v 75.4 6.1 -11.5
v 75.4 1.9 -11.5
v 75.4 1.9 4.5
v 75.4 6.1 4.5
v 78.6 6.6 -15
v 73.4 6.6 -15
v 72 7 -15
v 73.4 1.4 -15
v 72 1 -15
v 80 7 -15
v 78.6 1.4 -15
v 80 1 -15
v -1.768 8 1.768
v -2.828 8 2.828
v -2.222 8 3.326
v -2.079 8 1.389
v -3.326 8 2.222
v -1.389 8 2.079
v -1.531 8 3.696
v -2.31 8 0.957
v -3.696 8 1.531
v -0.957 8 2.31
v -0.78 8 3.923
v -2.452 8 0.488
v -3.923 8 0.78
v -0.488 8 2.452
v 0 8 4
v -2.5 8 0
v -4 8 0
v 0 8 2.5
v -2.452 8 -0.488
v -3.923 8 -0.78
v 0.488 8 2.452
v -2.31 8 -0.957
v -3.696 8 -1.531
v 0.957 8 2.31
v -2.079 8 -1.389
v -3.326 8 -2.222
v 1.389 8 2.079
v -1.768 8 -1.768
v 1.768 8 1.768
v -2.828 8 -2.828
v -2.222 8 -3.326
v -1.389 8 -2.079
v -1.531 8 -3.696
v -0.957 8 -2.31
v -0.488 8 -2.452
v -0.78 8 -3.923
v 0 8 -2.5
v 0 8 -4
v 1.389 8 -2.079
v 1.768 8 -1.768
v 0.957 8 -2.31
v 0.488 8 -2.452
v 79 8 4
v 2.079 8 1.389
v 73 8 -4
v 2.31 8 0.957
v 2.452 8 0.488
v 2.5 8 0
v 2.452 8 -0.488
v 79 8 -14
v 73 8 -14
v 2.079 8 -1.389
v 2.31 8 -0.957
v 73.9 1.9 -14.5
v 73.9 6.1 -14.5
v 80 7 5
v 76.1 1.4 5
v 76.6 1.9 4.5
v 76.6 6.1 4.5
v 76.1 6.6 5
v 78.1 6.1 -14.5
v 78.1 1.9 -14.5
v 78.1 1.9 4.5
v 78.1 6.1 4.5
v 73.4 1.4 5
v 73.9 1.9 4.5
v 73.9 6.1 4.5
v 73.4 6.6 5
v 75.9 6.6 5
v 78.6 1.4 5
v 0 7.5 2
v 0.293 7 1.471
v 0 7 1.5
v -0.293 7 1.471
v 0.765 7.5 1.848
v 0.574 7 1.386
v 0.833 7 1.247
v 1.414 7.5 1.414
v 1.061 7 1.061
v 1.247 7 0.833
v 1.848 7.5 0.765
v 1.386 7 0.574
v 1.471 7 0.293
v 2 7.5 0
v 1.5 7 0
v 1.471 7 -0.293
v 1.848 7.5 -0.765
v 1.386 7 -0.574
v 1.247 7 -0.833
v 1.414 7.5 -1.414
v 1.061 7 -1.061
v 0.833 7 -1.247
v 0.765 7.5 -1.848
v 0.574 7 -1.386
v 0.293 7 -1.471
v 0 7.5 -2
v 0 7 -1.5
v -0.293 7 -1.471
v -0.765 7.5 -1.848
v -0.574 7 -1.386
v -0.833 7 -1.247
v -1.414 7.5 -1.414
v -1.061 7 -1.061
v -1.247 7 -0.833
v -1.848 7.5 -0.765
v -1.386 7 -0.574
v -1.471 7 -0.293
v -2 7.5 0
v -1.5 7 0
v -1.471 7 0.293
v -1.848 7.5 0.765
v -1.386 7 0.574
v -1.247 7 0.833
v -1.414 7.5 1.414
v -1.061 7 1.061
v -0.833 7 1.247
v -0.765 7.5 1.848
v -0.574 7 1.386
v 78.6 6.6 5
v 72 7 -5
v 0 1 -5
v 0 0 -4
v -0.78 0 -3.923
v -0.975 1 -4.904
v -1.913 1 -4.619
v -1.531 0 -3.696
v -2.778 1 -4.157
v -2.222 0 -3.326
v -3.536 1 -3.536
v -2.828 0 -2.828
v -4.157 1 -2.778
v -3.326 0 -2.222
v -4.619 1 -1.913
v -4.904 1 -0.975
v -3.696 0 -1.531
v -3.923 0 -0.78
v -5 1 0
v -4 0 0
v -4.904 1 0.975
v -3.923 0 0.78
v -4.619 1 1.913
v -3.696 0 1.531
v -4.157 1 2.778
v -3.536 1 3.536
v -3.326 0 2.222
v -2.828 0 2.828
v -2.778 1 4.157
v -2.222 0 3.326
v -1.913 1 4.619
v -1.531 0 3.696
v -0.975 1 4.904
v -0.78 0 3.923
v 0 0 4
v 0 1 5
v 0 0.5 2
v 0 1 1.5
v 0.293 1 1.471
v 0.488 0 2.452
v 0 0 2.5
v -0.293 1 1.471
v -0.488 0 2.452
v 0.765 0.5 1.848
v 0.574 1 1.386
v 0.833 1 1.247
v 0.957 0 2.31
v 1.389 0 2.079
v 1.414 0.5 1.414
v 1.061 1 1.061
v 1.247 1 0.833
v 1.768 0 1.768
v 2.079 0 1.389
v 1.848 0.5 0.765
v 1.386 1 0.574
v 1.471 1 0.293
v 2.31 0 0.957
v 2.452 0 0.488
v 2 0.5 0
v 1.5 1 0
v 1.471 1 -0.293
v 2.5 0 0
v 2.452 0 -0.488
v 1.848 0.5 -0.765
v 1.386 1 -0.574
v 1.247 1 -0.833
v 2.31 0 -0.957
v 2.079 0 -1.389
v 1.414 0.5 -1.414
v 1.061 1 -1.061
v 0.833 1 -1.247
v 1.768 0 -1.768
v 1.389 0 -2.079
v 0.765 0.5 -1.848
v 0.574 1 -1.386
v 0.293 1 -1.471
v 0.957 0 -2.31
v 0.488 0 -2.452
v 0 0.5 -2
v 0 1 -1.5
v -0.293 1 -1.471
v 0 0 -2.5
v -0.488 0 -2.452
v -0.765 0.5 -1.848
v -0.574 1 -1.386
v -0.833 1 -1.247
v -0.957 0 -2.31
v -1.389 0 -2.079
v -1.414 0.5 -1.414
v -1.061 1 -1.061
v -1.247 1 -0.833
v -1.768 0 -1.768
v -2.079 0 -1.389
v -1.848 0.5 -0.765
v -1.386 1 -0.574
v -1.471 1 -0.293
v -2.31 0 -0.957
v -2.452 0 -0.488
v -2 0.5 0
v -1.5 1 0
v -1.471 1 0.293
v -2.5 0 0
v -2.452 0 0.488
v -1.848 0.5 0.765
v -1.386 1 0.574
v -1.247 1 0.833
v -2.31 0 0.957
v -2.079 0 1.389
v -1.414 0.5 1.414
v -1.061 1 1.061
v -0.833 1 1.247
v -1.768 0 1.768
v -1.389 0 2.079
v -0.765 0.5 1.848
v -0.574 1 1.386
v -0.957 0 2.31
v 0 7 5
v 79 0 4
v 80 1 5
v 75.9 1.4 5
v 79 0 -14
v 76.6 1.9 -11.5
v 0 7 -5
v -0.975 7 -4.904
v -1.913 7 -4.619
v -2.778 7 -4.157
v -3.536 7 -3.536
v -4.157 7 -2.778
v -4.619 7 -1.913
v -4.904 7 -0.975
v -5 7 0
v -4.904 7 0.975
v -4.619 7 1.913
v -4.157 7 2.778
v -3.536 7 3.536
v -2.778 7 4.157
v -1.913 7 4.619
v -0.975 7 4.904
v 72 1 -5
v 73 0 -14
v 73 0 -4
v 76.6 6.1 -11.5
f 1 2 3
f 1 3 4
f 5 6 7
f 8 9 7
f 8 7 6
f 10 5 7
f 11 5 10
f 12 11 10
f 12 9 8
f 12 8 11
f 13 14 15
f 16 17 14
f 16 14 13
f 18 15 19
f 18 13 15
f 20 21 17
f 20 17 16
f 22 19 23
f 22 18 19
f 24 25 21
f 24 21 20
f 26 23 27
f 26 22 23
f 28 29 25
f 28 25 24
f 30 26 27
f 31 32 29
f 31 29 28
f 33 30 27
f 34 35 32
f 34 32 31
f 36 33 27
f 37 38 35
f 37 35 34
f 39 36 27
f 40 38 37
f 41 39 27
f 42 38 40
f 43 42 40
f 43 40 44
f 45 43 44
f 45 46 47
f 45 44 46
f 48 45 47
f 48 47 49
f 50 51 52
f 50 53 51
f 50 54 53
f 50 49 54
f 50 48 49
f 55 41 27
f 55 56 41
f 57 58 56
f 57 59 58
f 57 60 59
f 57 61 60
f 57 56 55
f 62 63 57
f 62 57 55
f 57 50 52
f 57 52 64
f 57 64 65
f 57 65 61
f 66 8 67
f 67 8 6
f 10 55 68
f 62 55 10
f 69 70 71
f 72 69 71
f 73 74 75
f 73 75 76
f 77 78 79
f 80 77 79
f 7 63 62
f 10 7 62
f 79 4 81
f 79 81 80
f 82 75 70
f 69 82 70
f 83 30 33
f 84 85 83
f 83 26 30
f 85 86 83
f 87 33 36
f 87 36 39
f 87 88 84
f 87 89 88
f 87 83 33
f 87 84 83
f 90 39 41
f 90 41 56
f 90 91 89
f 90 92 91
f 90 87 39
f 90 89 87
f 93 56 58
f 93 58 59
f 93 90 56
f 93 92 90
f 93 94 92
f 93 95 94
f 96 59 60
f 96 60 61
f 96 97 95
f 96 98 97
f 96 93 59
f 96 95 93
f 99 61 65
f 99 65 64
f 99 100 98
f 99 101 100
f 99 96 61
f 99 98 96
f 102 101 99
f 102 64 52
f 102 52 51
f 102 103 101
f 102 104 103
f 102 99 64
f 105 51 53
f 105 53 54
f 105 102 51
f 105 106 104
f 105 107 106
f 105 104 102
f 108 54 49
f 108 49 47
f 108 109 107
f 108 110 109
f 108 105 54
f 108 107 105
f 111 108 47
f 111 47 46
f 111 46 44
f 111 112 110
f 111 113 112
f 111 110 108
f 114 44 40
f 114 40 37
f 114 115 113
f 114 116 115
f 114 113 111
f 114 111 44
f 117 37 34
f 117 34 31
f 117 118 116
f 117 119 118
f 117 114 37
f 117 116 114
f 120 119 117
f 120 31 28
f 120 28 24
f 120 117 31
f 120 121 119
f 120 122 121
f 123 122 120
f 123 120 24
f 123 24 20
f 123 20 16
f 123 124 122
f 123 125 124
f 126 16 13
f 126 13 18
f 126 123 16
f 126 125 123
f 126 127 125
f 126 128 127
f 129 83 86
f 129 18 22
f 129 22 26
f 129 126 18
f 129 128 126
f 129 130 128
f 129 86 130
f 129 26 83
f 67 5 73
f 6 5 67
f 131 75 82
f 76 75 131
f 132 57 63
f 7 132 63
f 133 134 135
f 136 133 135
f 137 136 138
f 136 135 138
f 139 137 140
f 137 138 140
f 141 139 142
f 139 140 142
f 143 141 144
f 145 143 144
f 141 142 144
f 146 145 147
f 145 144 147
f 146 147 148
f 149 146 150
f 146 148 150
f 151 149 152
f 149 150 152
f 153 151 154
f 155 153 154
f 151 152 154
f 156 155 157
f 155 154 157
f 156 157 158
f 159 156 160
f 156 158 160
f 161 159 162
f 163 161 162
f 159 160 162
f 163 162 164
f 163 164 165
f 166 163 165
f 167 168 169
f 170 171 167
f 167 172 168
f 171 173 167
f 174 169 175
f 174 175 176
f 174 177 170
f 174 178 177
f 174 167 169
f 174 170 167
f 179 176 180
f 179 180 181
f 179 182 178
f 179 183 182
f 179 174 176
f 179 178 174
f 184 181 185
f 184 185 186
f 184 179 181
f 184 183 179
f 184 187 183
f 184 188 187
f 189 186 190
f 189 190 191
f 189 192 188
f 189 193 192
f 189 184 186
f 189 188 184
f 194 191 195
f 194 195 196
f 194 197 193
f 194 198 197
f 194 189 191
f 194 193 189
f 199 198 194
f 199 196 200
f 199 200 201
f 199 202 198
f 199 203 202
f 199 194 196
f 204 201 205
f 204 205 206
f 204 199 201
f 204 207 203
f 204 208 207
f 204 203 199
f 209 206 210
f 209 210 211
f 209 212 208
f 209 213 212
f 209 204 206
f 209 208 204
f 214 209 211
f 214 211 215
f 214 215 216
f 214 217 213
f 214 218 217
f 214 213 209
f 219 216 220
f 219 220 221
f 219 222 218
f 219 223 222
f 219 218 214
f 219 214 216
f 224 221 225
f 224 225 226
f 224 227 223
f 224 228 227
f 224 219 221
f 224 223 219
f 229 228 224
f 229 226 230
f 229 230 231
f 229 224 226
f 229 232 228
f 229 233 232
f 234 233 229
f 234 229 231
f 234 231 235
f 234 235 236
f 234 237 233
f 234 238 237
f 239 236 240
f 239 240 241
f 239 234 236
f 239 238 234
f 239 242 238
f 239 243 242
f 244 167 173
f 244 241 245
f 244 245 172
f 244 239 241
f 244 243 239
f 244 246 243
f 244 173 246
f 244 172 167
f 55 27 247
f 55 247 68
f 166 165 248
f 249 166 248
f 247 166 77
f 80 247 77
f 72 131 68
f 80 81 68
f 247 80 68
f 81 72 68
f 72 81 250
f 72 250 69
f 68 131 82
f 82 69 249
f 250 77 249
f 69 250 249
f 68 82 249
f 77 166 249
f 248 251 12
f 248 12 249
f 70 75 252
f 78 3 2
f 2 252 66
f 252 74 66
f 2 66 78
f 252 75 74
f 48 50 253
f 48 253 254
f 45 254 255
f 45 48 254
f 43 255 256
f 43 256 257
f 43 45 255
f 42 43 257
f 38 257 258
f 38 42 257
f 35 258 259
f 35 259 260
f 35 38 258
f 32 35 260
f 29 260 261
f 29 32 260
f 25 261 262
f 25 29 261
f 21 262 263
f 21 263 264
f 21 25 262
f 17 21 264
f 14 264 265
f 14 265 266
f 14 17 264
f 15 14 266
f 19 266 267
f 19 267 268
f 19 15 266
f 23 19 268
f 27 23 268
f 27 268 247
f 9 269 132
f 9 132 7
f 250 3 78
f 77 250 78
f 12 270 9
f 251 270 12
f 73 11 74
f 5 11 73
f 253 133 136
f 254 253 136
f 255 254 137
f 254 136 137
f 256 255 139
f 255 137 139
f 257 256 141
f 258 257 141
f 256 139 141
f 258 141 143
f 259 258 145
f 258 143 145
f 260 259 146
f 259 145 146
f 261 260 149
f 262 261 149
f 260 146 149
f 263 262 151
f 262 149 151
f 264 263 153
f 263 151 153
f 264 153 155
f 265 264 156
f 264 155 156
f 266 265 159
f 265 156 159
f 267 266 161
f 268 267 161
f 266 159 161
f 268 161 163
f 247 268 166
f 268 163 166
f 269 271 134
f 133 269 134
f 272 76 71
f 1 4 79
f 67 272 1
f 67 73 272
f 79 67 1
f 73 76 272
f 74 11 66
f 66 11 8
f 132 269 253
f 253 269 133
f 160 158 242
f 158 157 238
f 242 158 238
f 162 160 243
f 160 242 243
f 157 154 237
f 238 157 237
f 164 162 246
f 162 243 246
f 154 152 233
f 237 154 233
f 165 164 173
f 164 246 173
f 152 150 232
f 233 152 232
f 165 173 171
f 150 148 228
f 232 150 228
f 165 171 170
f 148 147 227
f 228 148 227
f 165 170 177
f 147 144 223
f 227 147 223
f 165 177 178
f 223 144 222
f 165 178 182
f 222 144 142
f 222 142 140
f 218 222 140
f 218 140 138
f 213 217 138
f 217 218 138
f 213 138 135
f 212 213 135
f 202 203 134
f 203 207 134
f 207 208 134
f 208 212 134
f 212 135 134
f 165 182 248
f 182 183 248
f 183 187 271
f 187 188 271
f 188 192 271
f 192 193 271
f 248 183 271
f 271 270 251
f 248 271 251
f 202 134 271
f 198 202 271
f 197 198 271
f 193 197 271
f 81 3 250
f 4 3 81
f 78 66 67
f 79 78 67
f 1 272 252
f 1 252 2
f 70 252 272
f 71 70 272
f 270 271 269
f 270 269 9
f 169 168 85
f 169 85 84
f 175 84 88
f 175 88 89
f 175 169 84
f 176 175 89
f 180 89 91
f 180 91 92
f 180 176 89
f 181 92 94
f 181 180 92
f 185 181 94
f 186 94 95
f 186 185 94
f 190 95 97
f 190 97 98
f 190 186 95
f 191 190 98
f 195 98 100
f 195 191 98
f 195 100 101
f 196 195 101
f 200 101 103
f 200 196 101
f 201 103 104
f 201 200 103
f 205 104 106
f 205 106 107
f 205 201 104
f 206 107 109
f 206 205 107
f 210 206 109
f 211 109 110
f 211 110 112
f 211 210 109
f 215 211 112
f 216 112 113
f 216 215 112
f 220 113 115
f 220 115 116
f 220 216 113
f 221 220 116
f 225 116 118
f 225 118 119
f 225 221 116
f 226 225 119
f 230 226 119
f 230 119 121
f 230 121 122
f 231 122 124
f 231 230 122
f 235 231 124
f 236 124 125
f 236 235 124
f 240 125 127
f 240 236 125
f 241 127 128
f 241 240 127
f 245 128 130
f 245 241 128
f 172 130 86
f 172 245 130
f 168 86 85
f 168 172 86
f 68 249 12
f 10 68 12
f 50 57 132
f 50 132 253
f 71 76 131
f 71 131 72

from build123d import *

# Parameters (mm, degrees)
SKETCH1_W           = 8
SKETCH1_H           = 10
SKETCH1_R           = 5
SKETCH1_R_2         = 1.5
BOSS_EXTRUDE1_DEPTH = 8
SKETCH2_W           = 4.2
SKETCH2_H           = 4.2
CUT_EXTRUDE1_DEPTH  = 3.5
SKETCH3_W           = 1.5
SKETCH3_H           = 4.2
CUT_EXTRUDE2_DEPTH  = 83.074661132
CHAMFER1_SIZE       = 1
CHAMFER2_SIZE       = 0.5


with BuildPart() as part:
    # Sketch1 → Boss-Extrude1 (new body)
    # profile 1 of 3: a face of its own
    with BuildSketch(Plane(origin=(0, 0, 0), x_dir=(1, 0, 0), z_dir=(0, 1, 0))):
        with BuildLine():
            Line((72, 5), (0, 5))
            ThreePointArc((0, 5), (3.535533906, 3.535533906), (5, 0))
            ThreePointArc((5, 0), (3.535533906, -3.535533906), (0, -5))
            Line((0, -5), (80, -5))
            Line((80, -5), (80, 5))
            Line((80, 5), (72, 5))
        make_face()
    # profile 2 of 3: a face of its own
    with BuildSketch(Plane(origin=(0, 0, 0), x_dir=(1, 0, 0), z_dir=(0, 1, 0))):
        with Locations((76, 10)):
            Rectangle(SKETCH1_W, SKETCH1_H)
    # profile 3 of 3: a face of its own
    with BuildSketch(Plane(origin=(0, 0, 0), x_dir=(1, 0, 0), z_dir=(0, 1, 0))):
        Circle(SKETCH1_R)
        with Locations(Location((0, 0, 0), (0, 0, 270))):
            Circle(SKETCH1_R_2, mode=Mode.SUBTRACT)
    extrude(amount=BOSS_EXTRUDE1_DEPTH)

    # Sketch2 → Cut-Extrude1 (cut)
    with BuildSketch(Plane(origin=(0, 0, -15), x_dir=(-1, 0, 0), z_dir=(0, 0, -1))):
        with Locations((-76, 4)):
            Rectangle(SKETCH2_W, SKETCH2_H)
    extrude(amount=-CUT_EXTRUDE1_DEPTH, mode=Mode.SUBTRACT)

    # Sketch3 → Cut-Extrude2 (cut, through all)
    with BuildSketch(Plane(origin=(0, 0, -11.5), x_dir=(-1, 0, 0), z_dir=(0, 0, -1))):
        with Locations((-77.35, 4)):
            Rectangle(SKETCH3_W, SKETCH3_H)
        with Locations((-74.65, 4)):
            Rectangle(SKETCH3_W, SKETCH3_H)
    extrude(amount=-CUT_EXTRUDE2_DEPTH, mode=Mode.SUBTRACT)

    # Chamfer1
    chamfer1_edges = [part.edges().sort_by_distance(p)[0] for p in [
        (76, 0, -15),
        (80, 0, -5),
        (40, 0, 5),
        (-5, 0, 0),
        (-5, 8, 0),
        (36, 0, -5),
        (40, 8, 5),
        (80, 8, -5),
        (76, 8, -15),
        (72, 8, -10),
        (0, 8, -1.5),
        (36, 8, -5),
        (0, 0, -1.5),
        (72, 0, -10),
    ]]
    chamfer(chamfer1_edges, length=CHAMFER1_SIZE)

    # Chamfer2
    chamfer2_edges = [part.edges().sort_by_distance(p)[0] for p in [
        (78.1, 4, -15),
        (76, 1.9, -15),
        (73.9, 4, -15),
        (76, 6.1, -15),
        (78.1, 4, 5),
        (77.35, 6.1, 5),
        (76.6, 4, 5),
        (77.35, 1.9, 5),
        (73.9, 4, 5),
        (74.65, 1.9, 5),
        (75.4, 4, 5),
        (74.65, 6.1, 5),
    ]]
    chamfer(chamfer2_edges, length=CHAMFER2_SIZE)


solid = part.part
